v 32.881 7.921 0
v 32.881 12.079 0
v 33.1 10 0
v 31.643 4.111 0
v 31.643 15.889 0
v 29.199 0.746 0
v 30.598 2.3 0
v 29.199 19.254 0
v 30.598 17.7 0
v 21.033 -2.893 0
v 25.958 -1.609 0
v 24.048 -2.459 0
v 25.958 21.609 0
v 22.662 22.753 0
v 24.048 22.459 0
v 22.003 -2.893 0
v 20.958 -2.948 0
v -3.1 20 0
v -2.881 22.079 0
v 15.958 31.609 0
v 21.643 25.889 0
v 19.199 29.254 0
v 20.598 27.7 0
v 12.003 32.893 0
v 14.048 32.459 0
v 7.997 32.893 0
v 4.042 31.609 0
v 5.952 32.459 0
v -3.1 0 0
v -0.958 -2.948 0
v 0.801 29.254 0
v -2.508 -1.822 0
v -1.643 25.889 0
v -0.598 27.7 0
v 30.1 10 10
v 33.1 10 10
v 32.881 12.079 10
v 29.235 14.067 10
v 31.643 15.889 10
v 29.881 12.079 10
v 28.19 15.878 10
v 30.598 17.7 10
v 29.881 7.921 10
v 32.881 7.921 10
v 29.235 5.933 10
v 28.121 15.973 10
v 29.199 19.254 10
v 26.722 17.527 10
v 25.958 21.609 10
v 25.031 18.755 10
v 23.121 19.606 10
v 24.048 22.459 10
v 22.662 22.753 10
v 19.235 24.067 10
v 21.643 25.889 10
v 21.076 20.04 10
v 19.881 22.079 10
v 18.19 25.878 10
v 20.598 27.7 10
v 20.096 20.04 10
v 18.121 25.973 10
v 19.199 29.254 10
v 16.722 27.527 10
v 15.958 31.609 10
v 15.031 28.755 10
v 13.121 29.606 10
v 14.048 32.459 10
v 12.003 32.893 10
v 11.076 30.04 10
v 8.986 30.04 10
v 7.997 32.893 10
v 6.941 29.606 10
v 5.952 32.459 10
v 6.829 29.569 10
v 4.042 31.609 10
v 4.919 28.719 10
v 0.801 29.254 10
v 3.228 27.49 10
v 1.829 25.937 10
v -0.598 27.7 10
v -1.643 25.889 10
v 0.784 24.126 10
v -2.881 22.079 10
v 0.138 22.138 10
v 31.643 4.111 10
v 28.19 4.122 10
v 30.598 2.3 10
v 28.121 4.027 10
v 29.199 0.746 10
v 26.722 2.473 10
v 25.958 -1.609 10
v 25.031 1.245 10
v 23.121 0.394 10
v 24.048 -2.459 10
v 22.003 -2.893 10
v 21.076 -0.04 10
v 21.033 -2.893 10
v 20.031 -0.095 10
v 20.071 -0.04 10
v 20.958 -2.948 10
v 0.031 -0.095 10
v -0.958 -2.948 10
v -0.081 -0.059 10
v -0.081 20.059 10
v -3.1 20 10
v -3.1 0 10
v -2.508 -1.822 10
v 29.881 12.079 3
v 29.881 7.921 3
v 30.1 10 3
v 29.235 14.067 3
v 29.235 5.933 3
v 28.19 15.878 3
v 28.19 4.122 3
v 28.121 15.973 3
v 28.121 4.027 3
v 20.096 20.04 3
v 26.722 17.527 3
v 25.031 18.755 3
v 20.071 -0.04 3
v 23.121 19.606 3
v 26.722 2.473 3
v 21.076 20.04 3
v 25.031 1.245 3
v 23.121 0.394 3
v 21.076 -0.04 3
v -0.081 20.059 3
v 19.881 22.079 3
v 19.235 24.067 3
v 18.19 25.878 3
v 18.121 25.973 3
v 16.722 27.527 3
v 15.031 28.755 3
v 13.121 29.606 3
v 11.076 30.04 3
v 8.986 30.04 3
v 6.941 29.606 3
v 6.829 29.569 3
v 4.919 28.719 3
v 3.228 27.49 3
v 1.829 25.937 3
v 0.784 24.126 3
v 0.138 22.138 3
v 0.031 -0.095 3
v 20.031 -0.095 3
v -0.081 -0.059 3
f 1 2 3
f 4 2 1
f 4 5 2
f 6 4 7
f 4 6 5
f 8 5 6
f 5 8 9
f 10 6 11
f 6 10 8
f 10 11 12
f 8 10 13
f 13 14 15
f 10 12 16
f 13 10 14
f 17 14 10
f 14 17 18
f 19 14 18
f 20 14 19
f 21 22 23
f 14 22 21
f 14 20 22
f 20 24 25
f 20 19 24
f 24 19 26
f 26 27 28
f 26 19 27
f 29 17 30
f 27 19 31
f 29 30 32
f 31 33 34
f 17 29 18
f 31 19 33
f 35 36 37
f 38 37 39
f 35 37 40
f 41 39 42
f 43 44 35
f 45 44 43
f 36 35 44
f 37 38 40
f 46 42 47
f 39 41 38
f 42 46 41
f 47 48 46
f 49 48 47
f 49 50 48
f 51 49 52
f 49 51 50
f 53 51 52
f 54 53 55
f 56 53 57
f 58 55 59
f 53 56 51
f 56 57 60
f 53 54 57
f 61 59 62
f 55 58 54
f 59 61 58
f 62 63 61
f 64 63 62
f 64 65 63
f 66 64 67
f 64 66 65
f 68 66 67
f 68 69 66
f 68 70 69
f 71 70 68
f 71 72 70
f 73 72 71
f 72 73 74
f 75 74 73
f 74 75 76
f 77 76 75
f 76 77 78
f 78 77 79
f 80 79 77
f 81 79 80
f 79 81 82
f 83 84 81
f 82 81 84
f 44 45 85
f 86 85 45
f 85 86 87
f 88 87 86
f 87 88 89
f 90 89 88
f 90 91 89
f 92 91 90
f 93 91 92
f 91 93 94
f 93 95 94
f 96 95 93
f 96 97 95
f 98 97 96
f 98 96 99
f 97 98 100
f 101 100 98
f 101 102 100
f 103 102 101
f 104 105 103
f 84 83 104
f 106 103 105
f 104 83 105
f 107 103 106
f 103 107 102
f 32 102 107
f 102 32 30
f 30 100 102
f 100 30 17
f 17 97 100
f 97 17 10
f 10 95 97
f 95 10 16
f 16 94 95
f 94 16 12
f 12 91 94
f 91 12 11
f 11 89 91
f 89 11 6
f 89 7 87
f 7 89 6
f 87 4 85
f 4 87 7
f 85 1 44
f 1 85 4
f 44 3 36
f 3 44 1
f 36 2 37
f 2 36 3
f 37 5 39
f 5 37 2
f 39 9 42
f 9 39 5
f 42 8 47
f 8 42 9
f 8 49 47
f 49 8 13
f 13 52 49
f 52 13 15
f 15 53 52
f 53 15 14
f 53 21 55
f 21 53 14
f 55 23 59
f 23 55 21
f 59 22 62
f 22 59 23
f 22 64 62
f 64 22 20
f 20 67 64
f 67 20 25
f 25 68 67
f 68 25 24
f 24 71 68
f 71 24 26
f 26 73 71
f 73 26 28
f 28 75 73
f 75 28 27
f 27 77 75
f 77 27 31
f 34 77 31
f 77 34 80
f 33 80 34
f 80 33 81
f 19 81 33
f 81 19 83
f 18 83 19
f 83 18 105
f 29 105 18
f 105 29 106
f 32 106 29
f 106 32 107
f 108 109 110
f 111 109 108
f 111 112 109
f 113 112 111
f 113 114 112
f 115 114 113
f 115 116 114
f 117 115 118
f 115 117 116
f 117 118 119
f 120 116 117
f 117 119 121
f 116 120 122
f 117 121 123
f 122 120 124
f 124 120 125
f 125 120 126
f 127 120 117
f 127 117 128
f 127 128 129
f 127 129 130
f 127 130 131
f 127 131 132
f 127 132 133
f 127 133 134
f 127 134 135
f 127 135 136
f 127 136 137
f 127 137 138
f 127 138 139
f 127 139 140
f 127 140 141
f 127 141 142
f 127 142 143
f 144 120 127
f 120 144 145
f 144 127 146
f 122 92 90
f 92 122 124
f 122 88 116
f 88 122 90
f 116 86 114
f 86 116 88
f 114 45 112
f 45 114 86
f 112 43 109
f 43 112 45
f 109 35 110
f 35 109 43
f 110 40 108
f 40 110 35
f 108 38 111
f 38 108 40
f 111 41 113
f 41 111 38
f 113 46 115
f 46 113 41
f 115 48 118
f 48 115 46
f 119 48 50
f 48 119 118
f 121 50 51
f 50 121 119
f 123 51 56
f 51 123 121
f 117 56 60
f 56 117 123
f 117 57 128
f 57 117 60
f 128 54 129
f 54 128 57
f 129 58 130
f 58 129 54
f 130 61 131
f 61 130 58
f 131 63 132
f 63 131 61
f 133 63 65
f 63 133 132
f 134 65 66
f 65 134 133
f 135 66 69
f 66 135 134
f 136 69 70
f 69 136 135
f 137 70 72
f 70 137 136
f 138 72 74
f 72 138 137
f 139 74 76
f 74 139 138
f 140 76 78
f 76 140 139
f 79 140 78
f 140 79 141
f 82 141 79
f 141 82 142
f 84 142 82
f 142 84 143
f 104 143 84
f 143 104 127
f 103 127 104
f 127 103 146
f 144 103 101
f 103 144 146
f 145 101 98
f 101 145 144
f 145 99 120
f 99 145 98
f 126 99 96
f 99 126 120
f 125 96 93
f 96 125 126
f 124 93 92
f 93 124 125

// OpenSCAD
module heart_shape(size) {
     union() {
        square(size,size);
        translate([size/2,size,0]) circle(size/2);
        translate([size,size/2,0]) circle(size/2);
    }
}

module heart(size,thickness,height) {
   linear_extrude(height=height)
          minkowski() {
               heart_shape(size);
               circle(thickness+0.1);
        }
}

module heart_box(size,height,thickness) {
    difference() {
         heart(size,thickness,height);
         translate([0,0,thickness]) heart(size,0,height);
    }
}

heart_box(20,10,3);
